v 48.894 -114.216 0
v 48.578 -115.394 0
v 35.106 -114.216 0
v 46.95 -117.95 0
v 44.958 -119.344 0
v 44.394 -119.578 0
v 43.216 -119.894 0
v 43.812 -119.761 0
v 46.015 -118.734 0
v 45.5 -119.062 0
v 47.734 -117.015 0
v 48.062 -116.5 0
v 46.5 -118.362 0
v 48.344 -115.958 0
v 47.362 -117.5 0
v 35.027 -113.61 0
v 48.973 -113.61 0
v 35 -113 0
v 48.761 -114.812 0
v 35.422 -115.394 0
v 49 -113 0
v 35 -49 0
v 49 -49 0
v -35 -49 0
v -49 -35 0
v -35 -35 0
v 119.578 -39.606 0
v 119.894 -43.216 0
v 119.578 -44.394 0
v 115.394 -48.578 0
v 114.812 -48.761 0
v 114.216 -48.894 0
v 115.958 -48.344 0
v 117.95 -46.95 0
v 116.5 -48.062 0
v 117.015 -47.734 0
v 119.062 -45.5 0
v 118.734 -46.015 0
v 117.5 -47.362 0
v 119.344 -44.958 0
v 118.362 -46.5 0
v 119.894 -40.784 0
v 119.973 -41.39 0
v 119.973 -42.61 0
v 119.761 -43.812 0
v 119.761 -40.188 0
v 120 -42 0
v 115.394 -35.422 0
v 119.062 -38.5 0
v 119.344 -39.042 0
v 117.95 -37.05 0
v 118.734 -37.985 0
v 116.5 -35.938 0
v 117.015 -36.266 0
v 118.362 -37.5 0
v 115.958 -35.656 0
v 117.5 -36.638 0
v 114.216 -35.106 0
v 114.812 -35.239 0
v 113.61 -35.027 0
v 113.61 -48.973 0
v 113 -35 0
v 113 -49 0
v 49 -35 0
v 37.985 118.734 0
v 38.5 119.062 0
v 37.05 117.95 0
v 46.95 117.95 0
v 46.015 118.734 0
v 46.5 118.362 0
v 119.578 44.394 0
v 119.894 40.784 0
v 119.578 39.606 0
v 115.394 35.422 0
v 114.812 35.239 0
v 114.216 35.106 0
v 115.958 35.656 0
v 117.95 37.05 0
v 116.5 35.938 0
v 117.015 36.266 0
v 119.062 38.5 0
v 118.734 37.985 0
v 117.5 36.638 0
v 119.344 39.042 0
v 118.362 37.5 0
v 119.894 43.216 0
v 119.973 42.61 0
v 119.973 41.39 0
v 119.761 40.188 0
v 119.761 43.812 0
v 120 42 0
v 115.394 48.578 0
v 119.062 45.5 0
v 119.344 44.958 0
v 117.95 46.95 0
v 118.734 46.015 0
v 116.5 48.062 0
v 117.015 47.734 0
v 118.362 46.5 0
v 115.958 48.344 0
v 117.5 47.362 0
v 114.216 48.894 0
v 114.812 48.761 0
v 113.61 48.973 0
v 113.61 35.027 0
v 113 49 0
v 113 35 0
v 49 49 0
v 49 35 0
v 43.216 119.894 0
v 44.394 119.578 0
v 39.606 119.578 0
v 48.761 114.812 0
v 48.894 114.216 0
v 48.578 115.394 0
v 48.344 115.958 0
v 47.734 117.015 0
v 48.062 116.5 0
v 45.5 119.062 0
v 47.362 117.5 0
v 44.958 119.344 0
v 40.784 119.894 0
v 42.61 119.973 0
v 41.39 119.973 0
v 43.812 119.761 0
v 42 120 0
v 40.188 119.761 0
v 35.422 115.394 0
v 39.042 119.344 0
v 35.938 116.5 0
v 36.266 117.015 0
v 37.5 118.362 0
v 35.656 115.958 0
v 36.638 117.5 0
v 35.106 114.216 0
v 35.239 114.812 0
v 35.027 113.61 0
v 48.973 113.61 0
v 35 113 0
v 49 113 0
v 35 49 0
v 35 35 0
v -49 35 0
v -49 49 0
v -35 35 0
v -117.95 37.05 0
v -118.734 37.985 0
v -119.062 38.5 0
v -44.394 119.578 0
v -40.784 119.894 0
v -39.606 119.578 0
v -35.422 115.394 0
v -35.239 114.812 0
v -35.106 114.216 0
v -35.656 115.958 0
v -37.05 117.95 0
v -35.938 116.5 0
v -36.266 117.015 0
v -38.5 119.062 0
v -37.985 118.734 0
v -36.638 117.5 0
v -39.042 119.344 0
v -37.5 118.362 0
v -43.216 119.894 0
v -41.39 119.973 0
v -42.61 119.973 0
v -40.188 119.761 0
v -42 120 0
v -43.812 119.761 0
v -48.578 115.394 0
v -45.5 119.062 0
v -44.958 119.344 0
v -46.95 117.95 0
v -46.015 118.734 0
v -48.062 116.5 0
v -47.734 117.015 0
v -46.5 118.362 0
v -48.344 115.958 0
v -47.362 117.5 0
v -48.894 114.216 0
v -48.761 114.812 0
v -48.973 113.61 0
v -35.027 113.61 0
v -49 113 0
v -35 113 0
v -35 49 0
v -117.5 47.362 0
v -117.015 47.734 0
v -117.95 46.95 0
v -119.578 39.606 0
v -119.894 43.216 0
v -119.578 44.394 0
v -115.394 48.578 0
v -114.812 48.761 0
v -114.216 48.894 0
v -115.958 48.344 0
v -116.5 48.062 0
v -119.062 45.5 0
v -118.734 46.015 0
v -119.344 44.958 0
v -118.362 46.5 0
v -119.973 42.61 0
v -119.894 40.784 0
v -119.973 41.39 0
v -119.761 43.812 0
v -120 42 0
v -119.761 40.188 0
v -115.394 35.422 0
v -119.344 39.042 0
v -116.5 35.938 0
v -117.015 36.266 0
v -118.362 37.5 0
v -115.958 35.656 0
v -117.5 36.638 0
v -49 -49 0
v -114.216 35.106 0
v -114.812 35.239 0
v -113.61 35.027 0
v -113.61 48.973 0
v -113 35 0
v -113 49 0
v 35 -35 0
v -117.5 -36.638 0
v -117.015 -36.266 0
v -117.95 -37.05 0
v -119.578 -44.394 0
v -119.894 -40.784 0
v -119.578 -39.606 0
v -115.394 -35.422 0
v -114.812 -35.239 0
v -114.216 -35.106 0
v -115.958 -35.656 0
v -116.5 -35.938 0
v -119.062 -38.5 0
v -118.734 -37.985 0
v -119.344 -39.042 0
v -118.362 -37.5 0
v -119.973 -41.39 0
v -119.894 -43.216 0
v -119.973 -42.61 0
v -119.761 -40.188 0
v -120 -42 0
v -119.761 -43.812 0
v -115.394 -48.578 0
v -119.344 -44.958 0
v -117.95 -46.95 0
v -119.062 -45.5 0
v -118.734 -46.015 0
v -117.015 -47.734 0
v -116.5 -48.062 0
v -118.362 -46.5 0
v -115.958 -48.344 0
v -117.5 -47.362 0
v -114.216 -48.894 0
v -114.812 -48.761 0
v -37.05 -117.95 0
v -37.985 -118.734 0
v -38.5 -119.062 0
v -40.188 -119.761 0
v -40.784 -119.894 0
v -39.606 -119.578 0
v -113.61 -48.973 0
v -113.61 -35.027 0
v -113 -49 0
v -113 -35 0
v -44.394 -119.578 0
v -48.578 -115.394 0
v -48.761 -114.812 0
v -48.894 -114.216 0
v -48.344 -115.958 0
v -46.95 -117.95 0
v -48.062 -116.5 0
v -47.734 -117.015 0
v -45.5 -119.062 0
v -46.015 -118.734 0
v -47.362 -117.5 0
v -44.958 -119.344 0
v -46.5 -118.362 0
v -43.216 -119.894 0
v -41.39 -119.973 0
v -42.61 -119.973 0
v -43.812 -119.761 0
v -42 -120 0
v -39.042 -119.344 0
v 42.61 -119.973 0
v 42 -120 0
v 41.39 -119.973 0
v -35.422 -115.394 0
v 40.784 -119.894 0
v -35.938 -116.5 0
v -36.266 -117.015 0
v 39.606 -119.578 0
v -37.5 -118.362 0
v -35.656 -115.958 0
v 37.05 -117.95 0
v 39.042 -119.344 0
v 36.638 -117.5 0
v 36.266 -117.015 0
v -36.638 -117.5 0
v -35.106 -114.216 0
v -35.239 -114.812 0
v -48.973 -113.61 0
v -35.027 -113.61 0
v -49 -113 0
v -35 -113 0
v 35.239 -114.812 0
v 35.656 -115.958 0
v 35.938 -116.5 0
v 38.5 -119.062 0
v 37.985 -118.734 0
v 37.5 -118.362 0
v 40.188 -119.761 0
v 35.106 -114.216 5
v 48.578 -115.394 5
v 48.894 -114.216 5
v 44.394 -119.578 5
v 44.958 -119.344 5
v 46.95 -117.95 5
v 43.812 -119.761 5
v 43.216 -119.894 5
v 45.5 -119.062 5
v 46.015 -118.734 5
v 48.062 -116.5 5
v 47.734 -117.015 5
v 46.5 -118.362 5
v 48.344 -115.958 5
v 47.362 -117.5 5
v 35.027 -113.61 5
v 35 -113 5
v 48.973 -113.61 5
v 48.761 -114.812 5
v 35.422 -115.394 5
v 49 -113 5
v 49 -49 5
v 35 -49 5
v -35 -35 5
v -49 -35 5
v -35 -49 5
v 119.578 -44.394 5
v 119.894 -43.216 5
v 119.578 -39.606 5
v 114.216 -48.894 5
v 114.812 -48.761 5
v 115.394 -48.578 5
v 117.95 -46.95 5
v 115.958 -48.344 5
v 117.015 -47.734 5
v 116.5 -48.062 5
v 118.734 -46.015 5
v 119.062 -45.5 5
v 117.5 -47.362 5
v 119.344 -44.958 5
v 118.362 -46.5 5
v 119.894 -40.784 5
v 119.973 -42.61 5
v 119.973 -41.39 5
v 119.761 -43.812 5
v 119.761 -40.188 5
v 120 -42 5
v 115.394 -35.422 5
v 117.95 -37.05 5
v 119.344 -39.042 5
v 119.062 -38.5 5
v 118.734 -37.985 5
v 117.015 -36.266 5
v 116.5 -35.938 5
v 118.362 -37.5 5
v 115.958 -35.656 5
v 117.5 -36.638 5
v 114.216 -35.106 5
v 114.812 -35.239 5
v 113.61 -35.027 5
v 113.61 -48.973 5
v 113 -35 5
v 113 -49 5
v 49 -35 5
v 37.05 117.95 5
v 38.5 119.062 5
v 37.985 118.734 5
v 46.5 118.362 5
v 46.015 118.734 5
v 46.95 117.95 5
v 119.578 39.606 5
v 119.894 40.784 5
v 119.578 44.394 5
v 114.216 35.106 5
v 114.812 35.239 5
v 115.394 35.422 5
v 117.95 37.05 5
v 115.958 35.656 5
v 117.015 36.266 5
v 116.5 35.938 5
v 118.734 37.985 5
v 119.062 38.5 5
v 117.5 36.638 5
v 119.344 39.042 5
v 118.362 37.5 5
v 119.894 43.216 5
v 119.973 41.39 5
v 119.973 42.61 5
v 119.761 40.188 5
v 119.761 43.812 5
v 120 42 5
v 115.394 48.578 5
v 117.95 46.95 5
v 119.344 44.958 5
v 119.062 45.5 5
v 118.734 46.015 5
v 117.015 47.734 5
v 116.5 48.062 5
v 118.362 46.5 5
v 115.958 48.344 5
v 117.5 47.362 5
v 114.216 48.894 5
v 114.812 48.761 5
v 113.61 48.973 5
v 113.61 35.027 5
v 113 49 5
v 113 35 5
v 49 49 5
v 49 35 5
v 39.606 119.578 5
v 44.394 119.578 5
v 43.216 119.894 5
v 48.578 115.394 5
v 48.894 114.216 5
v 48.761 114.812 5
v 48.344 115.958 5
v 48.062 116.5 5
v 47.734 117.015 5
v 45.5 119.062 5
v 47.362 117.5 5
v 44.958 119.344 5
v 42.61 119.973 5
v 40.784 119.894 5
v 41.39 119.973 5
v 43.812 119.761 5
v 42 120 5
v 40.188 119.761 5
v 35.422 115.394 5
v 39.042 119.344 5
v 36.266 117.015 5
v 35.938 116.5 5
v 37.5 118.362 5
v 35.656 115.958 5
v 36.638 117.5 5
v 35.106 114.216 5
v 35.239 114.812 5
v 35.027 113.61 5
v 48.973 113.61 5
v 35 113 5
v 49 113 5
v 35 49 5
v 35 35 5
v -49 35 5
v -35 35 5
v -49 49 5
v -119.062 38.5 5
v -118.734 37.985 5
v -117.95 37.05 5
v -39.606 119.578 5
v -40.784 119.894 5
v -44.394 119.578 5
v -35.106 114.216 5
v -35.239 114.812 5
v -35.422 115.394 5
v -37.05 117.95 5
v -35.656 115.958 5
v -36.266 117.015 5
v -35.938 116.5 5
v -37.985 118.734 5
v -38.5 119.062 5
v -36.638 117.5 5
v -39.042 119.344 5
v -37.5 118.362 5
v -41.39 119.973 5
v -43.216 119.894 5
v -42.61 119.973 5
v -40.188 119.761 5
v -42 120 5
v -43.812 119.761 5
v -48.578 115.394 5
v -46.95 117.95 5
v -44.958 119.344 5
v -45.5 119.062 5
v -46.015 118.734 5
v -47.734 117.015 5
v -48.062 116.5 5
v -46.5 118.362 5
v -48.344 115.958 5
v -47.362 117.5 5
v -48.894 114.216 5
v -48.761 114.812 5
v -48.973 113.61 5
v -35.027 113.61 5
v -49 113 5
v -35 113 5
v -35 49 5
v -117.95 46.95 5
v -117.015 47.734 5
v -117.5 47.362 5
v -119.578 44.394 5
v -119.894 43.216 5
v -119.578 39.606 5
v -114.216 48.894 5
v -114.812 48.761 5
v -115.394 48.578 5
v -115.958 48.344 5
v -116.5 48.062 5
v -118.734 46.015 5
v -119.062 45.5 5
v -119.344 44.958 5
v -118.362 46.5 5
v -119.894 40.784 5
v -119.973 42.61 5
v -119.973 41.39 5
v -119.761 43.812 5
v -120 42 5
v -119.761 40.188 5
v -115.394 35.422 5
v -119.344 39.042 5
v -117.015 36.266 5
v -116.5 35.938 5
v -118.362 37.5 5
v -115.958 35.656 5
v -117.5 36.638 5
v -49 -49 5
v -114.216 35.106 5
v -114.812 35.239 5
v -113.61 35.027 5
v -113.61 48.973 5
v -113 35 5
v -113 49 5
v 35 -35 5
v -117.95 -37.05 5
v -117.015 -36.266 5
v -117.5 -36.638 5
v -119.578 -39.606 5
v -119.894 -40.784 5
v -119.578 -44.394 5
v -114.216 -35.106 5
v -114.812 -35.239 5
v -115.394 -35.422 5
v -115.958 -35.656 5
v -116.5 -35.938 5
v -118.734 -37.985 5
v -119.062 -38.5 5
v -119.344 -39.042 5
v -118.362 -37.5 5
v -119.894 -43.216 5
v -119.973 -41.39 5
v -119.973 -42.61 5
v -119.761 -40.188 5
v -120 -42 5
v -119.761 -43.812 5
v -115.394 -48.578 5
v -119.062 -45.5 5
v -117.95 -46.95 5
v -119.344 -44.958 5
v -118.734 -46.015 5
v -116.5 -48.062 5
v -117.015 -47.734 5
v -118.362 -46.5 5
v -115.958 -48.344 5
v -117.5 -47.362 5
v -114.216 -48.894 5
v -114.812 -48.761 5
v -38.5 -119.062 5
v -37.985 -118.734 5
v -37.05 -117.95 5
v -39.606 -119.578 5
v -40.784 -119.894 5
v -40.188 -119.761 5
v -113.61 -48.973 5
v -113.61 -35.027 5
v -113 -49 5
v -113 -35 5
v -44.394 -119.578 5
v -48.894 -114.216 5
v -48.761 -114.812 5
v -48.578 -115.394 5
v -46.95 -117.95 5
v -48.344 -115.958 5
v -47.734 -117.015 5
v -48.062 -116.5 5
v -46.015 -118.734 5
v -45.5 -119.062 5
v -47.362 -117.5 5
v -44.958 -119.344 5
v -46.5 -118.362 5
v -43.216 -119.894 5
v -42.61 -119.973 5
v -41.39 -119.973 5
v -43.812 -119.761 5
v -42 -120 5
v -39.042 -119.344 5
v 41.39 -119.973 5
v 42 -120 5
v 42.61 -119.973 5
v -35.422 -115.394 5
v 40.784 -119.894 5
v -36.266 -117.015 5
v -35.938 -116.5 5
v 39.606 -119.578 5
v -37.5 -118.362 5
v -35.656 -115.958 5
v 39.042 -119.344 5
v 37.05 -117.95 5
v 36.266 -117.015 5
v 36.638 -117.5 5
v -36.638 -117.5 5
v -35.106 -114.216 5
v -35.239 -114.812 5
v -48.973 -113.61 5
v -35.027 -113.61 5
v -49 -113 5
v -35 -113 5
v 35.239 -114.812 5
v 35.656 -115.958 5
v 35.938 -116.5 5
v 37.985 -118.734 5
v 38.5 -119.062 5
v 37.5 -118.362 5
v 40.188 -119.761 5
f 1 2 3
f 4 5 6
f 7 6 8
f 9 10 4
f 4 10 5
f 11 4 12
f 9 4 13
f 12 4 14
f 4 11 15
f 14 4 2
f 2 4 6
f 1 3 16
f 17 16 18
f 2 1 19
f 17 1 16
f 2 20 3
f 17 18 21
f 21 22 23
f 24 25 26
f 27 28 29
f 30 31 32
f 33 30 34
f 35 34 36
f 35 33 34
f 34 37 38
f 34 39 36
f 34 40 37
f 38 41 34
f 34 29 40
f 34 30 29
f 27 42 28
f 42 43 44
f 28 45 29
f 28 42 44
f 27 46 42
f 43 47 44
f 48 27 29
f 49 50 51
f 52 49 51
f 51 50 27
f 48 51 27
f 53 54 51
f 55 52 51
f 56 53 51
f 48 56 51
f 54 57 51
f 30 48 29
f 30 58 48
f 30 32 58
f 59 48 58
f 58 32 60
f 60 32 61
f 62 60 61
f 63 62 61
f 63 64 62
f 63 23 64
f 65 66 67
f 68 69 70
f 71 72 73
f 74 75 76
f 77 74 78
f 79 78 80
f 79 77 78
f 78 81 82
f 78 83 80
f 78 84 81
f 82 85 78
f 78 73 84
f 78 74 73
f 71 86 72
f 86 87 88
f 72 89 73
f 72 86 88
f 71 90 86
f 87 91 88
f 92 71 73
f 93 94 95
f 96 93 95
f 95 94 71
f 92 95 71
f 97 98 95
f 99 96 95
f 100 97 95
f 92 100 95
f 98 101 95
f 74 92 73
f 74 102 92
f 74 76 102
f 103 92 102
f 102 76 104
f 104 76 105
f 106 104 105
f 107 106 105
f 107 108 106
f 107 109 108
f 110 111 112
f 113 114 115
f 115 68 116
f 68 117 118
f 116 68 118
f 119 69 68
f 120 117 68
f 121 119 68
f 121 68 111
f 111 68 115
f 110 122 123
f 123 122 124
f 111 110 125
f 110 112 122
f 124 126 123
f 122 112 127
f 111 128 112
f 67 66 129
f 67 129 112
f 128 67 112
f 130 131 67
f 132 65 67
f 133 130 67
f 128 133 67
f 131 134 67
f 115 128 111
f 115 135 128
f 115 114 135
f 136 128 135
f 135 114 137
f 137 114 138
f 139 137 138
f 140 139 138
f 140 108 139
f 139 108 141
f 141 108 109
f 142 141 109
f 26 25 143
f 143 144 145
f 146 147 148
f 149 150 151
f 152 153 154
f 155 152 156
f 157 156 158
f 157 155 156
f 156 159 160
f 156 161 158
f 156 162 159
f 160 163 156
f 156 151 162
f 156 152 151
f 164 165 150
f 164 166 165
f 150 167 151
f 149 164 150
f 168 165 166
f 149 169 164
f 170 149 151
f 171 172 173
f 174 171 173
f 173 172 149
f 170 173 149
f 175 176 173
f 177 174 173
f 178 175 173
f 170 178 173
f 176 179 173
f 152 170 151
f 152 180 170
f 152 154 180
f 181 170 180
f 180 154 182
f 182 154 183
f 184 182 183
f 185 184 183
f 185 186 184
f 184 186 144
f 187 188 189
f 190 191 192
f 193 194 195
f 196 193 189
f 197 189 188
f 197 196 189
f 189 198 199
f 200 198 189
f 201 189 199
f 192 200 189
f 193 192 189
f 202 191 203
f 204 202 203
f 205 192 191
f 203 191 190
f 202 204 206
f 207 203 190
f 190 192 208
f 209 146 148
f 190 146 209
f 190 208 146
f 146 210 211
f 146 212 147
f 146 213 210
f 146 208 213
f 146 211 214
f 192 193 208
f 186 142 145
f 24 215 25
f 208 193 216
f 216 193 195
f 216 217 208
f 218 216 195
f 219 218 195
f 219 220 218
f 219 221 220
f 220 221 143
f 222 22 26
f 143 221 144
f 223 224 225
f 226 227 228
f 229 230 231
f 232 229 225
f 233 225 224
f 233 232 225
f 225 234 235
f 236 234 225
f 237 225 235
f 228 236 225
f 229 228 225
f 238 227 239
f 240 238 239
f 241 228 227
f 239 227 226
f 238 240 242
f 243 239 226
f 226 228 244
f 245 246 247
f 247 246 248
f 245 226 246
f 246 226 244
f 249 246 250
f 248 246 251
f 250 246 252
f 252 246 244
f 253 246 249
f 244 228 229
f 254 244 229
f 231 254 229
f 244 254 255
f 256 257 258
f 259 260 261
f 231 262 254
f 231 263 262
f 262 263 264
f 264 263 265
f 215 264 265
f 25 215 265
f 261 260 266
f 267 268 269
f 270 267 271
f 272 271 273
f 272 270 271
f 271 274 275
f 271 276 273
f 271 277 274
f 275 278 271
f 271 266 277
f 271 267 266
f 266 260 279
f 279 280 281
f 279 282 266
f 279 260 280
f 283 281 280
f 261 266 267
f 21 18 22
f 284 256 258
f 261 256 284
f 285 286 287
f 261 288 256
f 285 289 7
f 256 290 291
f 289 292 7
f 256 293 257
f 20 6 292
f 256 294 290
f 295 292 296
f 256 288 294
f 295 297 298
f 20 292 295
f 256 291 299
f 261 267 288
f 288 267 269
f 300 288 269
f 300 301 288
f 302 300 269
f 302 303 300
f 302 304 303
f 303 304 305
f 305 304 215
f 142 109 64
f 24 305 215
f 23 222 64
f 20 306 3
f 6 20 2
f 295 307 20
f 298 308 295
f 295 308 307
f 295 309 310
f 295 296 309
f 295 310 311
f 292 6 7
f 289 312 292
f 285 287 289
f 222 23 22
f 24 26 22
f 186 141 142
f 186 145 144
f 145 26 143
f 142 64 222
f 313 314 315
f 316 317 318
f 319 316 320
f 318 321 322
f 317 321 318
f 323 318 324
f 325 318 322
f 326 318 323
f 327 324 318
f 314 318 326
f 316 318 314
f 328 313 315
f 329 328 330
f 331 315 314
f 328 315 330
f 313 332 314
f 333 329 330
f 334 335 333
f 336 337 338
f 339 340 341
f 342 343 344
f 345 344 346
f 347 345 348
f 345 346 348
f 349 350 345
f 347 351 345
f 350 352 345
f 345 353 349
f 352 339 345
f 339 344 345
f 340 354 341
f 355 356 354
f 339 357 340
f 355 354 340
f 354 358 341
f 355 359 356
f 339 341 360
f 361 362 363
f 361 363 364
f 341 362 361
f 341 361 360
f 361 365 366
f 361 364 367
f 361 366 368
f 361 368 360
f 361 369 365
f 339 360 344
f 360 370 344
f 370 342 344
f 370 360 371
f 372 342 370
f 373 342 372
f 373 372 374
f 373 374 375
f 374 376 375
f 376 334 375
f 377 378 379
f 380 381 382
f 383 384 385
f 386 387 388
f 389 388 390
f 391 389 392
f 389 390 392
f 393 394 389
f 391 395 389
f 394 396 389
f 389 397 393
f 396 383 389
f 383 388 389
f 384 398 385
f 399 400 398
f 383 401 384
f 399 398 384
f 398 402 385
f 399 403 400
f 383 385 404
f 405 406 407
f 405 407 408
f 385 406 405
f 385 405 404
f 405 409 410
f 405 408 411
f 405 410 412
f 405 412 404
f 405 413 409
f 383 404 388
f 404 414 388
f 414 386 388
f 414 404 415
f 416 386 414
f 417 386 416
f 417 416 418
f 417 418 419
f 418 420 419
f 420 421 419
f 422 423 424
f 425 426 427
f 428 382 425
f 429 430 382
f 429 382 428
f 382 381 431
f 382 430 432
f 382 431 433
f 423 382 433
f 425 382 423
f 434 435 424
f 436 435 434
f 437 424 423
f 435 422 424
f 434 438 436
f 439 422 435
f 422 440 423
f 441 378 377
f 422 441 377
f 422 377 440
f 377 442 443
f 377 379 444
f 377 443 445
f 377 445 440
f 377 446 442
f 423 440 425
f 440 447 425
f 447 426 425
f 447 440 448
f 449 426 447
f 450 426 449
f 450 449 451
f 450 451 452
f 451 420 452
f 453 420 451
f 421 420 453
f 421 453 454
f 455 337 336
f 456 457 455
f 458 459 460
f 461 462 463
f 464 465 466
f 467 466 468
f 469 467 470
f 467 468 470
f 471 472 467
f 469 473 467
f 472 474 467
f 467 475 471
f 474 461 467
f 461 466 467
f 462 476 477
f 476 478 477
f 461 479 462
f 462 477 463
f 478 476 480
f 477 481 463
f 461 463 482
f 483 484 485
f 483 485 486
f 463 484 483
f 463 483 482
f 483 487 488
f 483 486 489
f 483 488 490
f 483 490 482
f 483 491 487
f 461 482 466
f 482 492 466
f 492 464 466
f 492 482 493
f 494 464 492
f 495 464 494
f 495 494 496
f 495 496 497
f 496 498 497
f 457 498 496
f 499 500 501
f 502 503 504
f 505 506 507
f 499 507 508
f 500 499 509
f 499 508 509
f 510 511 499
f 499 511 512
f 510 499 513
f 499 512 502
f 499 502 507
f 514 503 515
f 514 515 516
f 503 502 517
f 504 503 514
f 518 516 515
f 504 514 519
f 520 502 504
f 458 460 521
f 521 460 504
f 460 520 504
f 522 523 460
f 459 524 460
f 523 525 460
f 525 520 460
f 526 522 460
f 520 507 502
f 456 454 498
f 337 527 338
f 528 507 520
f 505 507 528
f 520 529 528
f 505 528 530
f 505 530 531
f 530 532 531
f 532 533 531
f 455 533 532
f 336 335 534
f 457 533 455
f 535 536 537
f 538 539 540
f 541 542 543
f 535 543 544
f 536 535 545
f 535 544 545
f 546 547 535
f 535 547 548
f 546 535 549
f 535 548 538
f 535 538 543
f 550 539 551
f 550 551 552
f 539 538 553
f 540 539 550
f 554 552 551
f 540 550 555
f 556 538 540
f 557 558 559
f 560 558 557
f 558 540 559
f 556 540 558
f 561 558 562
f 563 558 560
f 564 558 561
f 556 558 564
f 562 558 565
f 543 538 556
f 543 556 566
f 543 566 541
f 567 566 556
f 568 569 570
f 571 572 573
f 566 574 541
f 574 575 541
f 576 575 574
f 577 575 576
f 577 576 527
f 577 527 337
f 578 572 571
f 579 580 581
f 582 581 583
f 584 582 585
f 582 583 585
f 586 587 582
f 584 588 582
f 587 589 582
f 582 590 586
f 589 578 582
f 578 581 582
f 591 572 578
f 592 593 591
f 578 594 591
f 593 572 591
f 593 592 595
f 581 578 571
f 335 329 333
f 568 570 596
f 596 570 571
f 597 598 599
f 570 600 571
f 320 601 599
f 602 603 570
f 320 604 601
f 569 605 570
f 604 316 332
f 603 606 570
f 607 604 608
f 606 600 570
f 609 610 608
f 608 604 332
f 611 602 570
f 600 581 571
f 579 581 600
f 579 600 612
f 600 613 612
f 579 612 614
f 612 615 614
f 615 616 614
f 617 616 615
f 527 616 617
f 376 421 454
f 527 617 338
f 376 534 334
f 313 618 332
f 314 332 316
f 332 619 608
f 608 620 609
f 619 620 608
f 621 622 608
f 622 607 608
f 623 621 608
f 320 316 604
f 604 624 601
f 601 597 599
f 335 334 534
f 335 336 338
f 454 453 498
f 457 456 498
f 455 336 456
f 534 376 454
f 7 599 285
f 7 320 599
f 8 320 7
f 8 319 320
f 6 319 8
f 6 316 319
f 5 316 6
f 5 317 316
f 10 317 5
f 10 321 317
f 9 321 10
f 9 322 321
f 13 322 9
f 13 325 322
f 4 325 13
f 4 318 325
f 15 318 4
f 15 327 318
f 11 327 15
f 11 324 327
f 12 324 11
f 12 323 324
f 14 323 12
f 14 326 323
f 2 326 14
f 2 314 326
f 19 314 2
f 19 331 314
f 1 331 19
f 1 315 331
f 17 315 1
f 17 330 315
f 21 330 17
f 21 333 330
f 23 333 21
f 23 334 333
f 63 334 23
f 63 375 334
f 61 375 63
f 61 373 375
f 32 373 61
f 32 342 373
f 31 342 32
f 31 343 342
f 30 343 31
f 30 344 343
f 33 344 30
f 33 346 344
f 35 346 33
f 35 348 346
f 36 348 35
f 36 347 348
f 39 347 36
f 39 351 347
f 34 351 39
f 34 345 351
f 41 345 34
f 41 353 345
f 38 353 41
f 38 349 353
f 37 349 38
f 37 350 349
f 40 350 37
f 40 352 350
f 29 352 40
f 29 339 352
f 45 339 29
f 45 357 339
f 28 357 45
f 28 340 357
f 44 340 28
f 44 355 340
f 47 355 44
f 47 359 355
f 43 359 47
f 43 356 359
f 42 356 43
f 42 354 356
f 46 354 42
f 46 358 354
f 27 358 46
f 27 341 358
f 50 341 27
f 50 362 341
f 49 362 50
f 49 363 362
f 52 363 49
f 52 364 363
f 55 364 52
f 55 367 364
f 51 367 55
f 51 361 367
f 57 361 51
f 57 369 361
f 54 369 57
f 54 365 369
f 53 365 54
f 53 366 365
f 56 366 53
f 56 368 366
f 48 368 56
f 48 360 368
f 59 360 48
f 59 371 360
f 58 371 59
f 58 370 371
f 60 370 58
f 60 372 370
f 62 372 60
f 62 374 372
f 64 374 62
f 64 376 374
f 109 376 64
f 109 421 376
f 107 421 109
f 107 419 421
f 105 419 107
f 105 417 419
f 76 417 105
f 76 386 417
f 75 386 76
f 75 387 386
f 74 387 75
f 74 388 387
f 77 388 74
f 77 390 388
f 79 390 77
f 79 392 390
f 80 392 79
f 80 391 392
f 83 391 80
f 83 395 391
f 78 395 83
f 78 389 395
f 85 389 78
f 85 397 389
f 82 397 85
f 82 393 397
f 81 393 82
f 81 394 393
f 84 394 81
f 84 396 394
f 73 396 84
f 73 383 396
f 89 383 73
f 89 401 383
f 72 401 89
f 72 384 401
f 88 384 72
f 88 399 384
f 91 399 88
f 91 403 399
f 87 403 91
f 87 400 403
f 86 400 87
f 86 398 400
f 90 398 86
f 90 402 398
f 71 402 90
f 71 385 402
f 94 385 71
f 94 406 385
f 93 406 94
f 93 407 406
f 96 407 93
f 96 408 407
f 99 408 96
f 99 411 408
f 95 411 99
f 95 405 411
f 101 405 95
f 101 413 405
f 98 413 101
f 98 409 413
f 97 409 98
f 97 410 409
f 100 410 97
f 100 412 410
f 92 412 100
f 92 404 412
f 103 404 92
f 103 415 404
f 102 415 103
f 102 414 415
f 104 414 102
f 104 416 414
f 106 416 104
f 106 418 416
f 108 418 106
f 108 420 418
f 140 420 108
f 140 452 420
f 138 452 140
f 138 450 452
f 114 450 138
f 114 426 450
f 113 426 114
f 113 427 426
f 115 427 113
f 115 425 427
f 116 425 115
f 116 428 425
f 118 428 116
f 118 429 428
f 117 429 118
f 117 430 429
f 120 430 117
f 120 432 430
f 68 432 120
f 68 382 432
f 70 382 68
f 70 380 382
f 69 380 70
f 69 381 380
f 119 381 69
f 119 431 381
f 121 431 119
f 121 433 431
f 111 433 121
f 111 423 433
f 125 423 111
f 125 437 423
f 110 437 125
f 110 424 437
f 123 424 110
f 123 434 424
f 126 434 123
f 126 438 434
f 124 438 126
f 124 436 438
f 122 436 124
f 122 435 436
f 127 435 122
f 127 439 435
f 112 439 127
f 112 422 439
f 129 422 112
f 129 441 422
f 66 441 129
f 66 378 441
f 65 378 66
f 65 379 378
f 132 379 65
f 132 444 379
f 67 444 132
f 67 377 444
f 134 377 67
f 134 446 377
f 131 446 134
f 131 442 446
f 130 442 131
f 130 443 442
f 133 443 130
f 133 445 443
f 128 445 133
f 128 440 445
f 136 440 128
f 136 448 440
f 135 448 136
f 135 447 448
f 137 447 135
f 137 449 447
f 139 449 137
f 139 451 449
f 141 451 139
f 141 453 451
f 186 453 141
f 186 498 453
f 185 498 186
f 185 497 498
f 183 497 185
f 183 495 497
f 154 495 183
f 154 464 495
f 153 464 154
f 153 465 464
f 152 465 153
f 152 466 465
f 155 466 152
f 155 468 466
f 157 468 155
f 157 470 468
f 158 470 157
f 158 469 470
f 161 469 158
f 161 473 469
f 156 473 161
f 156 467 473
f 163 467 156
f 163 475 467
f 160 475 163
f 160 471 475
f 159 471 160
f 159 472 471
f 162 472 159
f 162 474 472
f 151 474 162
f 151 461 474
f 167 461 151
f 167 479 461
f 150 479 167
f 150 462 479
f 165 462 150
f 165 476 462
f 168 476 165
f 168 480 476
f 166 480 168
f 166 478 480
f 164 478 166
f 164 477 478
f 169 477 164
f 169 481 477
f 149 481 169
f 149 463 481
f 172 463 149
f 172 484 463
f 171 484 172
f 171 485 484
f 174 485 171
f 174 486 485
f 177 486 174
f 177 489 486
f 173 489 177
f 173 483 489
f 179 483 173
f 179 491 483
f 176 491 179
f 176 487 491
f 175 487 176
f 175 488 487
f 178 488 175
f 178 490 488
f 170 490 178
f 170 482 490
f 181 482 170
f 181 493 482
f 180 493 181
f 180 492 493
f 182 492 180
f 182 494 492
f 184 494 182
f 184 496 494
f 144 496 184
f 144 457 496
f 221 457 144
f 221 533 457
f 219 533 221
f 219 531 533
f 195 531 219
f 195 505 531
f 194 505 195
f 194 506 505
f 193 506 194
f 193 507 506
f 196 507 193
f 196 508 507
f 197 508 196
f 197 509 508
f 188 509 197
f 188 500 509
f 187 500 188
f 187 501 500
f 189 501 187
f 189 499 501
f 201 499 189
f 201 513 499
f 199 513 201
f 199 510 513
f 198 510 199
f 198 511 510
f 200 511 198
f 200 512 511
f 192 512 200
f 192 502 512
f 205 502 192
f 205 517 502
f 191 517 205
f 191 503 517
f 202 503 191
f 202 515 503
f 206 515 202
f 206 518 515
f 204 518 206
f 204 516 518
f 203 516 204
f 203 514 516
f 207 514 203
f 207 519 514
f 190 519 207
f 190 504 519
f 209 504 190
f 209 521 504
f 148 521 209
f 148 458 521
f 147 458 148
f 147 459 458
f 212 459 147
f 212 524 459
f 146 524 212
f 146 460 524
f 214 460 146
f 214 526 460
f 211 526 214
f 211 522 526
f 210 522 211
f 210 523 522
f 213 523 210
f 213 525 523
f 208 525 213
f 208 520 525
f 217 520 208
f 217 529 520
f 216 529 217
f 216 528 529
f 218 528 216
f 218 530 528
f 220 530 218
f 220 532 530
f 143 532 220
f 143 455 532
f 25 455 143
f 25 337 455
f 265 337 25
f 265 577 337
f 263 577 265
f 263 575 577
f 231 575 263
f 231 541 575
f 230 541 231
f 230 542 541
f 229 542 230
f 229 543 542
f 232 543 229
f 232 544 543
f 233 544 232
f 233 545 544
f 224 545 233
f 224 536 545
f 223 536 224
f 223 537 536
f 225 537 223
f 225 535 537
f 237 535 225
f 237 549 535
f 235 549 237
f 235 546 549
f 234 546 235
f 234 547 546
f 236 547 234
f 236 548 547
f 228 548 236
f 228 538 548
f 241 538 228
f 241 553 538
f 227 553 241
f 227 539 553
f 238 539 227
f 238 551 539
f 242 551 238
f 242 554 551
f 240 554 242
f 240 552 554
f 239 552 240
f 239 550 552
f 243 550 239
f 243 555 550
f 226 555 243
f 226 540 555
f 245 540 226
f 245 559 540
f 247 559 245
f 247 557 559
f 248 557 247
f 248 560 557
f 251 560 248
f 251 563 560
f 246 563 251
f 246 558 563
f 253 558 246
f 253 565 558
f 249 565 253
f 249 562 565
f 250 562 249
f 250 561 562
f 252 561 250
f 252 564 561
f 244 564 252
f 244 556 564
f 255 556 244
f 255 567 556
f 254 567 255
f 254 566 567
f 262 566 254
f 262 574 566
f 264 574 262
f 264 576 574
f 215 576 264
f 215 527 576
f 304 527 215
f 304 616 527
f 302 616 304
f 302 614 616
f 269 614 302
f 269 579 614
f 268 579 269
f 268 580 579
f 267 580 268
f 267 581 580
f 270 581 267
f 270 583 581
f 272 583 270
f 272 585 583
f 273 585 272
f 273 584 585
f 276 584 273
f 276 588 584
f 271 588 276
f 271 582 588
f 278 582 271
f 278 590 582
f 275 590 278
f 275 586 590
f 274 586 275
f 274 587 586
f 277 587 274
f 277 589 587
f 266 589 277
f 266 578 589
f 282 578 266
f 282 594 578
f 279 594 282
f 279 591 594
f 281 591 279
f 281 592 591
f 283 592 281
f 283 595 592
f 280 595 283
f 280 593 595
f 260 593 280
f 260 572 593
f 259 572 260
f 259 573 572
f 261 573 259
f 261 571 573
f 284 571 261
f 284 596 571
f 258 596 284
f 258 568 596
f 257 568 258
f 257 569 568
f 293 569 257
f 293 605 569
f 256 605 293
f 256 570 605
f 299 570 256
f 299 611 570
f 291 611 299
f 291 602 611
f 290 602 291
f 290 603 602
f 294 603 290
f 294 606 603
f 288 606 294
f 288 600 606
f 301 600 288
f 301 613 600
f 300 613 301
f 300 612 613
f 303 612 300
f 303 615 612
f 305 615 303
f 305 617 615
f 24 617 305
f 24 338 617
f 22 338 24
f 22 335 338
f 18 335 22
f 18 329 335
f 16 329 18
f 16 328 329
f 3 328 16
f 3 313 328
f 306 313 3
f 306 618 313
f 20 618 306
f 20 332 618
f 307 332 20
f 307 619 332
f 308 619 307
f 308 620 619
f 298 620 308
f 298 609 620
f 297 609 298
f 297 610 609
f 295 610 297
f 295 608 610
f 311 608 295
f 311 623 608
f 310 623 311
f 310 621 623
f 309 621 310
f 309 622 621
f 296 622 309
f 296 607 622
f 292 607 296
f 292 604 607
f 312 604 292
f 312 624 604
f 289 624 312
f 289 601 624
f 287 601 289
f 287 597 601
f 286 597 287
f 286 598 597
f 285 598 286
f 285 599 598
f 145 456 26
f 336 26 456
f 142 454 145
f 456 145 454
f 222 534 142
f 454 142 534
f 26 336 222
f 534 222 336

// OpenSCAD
// Large, camera-legible tic-tac-toe set for two SO-101 arms.
//
// The board is intentionally only the central hashtag: no backing plate, seats,
// tags, text, or colour changes.  Its 240 mm envelope leaves 8 mm per side on a
// Bambu Lab P2S 256 x 256 mm bed.  The 14 mm bars divide that envelope into
// three ~71 mm clear cells. Tokens are 52 mm wide, leaving ~19 mm of placement
// tolerance inside every cell. The lightweight revision uses an 8 mm grasp
// height, square X ends, and a smooth circular O.
//
// Render:
//   openscad -D 'PART="board"' -o out/ttt_p2s_hashtag.stl scad/tictactoe_p2s_large.scad
//   openscad -D 'PART="X"'     -o out/ttt_p2s_X.stl       scad/tictactoe_p2s_large.scad
//   openscad -D 'PART="O"'     -o out/ttt_p2s_O.stl       scad/tictactoe_p2s_large.scad

$fn = 72;

PART = "board";             // board | X | O | set_preview

// P2S: 256 x 256 mm bed.  240 mm keeps an 8 mm model margin on every side;
// the sliced skirt expands the occupied toolpath to 244 mm, leaving 6 mm.
BOARD_SIZE = 240;
BOARD_H = 5;
BAR_W = 14;
BAR_OFFSET = 42;

// Large enough to read cleanly from the overhead camera, still within the
// SO-101 gripper envelope. Reduced height and narrow strokes cut print mass.
TOKEN_SIZE = 52;
TOKEN_H = 8;
X_BAR_W = 10;
O_INNER_D = 38;
O_FACETS = 96;

EPS = 0.01;

// A capsule gives the hashtag rounded ends without pushing beyond BOARD_SIZE.
module capsule_2d(length, width) {
    hull()
        for (x = [-(length - width) / 2, (length - width) / 2])
            translate([x, 0]) circle(d = width);
}

module hashtag_2d() {
    union() {
        for (y = [-BAR_OFFSET, BAR_OFFSET])
            translate([0, y]) capsule_2d(BOARD_SIZE, BAR_W);
        for (x = [-BAR_OFFSET, BAR_OFFSET])
            translate([x, 0]) rotate(90) capsule_2d(BOARD_SIZE, BAR_W);
    }
}

module board() {
    linear_extrude(height = BOARD_H) hashtag_2d();
}

// Two square-ended bars. This length formula keeps the exact X/Y envelope at
// TOKEN_SIZE after the 45-degree rotations.
module x_2d() {
    stroke_len = TOKEN_SIZE * sqrt(2) - X_BAR_W;
    union()
        for (a = [45, -45]) rotate(a) square([stroke_len, X_BAR_W], center = true);
}

module o_2d() {
    difference() {
        circle(d = TOKEN_SIZE, $fn = O_FACETS);
        circle(d = O_INNER_D, $fn = O_FACETS);
    }
}

// A straight, support-free extrusion keeps the entire 8 mm side wall available
// to the gripper. The X has flat ends; the O is a smooth circular ring.
module token(shape = "X") {
    linear_extrude(height = TOKEN_H)
        if (shape == "X") x_2d(); else o_2d();
}

module set_preview() {
    color("#111111") board();
    for (p = [[-84, -84], [0, 0], [84, 84]])
        color("#D02727") translate([p[0], p[1], BOARD_H]) token("X");
    for (p = [[0, -84], [84, 0], [-84, 84]])
        color("#5F6367") translate([p[0], p[1], BOARD_H]) token("O");
}

if      (PART == "board")       board();
else if (PART == "X")           token("X");
else if (PART == "O")           token("O");
else if (PART == "set_preview") set_preview();
else assert(false, str("unknown PART ", PART));

CELL_CLEAR = (BOARD_SIZE - 2 * BAR_W) / 3;
echo(str("board=", BOARD_SIZE, "x", BOARD_SIZE, "x", BOARD_H,
         " bar=", BAR_W, " cell_clear=", CELL_CLEAR,
         " bed_margin=", (256 - BOARD_SIZE) / 2));
echo(str("token=", TOKEN_SIZE, "x", TOKEN_SIZE, "x", TOKEN_H,
         " cell_clearance=", CELL_CLEAR - TOKEN_SIZE));
